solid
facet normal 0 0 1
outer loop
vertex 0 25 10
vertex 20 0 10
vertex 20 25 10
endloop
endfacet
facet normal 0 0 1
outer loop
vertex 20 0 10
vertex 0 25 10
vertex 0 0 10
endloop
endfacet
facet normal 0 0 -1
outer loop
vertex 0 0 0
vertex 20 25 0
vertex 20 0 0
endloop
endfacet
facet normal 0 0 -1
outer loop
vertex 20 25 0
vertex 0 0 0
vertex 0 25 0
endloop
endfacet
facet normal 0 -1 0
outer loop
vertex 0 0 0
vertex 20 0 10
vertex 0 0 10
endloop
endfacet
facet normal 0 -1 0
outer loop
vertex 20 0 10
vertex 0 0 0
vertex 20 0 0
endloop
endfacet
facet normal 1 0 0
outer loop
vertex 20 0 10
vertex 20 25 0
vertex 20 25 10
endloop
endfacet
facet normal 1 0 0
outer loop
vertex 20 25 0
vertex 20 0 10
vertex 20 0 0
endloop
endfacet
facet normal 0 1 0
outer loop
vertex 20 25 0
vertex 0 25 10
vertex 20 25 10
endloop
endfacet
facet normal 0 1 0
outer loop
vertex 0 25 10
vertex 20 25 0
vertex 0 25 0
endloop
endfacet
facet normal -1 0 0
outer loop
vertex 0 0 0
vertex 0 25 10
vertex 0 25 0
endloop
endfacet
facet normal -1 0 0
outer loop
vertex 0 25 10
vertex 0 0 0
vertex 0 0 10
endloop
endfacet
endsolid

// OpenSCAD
// Generated by generate_scads.py
cube(size=[20,25,10], center=false);
